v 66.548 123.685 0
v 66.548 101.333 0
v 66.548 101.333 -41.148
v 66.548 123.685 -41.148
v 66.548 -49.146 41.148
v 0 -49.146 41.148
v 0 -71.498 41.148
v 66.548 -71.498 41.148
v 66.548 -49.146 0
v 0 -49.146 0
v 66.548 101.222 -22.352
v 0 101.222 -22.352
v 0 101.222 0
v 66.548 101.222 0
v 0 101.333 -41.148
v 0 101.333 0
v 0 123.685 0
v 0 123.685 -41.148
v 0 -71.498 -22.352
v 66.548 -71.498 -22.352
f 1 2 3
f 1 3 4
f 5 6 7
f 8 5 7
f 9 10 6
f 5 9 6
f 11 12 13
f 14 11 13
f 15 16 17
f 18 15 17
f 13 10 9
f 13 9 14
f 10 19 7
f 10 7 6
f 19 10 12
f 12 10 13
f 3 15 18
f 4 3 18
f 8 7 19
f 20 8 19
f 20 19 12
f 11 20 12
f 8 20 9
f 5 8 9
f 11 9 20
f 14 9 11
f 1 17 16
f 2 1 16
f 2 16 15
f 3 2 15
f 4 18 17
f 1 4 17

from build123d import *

# Parameters (mm, degrees)
F0_W     = 150.368
F0_H     = 22.352
F1_DEPTH = 66.548


with BuildPart() as f1:
    # F0 (on Right) → F1 (new body)
    with BuildSketch(Plane.YZ):
        with Locations((26.038232, -11.176)):
            Rectangle(F0_W, F0_H)
        Polygon((-49.145768, 41.148), (-71.497768, 41.148), (-71.497768, -22.352), (-49.145768, -22.352), (-49.145768, 0), align=None)
        Polygon((103.630818, 0), (101.332784, 0), (101.332784, -41.148), (123.684784, -41.148), (123.684784, 0), align=None)
    extrude(amount=F1_DEPTH)


solid = f1.part
